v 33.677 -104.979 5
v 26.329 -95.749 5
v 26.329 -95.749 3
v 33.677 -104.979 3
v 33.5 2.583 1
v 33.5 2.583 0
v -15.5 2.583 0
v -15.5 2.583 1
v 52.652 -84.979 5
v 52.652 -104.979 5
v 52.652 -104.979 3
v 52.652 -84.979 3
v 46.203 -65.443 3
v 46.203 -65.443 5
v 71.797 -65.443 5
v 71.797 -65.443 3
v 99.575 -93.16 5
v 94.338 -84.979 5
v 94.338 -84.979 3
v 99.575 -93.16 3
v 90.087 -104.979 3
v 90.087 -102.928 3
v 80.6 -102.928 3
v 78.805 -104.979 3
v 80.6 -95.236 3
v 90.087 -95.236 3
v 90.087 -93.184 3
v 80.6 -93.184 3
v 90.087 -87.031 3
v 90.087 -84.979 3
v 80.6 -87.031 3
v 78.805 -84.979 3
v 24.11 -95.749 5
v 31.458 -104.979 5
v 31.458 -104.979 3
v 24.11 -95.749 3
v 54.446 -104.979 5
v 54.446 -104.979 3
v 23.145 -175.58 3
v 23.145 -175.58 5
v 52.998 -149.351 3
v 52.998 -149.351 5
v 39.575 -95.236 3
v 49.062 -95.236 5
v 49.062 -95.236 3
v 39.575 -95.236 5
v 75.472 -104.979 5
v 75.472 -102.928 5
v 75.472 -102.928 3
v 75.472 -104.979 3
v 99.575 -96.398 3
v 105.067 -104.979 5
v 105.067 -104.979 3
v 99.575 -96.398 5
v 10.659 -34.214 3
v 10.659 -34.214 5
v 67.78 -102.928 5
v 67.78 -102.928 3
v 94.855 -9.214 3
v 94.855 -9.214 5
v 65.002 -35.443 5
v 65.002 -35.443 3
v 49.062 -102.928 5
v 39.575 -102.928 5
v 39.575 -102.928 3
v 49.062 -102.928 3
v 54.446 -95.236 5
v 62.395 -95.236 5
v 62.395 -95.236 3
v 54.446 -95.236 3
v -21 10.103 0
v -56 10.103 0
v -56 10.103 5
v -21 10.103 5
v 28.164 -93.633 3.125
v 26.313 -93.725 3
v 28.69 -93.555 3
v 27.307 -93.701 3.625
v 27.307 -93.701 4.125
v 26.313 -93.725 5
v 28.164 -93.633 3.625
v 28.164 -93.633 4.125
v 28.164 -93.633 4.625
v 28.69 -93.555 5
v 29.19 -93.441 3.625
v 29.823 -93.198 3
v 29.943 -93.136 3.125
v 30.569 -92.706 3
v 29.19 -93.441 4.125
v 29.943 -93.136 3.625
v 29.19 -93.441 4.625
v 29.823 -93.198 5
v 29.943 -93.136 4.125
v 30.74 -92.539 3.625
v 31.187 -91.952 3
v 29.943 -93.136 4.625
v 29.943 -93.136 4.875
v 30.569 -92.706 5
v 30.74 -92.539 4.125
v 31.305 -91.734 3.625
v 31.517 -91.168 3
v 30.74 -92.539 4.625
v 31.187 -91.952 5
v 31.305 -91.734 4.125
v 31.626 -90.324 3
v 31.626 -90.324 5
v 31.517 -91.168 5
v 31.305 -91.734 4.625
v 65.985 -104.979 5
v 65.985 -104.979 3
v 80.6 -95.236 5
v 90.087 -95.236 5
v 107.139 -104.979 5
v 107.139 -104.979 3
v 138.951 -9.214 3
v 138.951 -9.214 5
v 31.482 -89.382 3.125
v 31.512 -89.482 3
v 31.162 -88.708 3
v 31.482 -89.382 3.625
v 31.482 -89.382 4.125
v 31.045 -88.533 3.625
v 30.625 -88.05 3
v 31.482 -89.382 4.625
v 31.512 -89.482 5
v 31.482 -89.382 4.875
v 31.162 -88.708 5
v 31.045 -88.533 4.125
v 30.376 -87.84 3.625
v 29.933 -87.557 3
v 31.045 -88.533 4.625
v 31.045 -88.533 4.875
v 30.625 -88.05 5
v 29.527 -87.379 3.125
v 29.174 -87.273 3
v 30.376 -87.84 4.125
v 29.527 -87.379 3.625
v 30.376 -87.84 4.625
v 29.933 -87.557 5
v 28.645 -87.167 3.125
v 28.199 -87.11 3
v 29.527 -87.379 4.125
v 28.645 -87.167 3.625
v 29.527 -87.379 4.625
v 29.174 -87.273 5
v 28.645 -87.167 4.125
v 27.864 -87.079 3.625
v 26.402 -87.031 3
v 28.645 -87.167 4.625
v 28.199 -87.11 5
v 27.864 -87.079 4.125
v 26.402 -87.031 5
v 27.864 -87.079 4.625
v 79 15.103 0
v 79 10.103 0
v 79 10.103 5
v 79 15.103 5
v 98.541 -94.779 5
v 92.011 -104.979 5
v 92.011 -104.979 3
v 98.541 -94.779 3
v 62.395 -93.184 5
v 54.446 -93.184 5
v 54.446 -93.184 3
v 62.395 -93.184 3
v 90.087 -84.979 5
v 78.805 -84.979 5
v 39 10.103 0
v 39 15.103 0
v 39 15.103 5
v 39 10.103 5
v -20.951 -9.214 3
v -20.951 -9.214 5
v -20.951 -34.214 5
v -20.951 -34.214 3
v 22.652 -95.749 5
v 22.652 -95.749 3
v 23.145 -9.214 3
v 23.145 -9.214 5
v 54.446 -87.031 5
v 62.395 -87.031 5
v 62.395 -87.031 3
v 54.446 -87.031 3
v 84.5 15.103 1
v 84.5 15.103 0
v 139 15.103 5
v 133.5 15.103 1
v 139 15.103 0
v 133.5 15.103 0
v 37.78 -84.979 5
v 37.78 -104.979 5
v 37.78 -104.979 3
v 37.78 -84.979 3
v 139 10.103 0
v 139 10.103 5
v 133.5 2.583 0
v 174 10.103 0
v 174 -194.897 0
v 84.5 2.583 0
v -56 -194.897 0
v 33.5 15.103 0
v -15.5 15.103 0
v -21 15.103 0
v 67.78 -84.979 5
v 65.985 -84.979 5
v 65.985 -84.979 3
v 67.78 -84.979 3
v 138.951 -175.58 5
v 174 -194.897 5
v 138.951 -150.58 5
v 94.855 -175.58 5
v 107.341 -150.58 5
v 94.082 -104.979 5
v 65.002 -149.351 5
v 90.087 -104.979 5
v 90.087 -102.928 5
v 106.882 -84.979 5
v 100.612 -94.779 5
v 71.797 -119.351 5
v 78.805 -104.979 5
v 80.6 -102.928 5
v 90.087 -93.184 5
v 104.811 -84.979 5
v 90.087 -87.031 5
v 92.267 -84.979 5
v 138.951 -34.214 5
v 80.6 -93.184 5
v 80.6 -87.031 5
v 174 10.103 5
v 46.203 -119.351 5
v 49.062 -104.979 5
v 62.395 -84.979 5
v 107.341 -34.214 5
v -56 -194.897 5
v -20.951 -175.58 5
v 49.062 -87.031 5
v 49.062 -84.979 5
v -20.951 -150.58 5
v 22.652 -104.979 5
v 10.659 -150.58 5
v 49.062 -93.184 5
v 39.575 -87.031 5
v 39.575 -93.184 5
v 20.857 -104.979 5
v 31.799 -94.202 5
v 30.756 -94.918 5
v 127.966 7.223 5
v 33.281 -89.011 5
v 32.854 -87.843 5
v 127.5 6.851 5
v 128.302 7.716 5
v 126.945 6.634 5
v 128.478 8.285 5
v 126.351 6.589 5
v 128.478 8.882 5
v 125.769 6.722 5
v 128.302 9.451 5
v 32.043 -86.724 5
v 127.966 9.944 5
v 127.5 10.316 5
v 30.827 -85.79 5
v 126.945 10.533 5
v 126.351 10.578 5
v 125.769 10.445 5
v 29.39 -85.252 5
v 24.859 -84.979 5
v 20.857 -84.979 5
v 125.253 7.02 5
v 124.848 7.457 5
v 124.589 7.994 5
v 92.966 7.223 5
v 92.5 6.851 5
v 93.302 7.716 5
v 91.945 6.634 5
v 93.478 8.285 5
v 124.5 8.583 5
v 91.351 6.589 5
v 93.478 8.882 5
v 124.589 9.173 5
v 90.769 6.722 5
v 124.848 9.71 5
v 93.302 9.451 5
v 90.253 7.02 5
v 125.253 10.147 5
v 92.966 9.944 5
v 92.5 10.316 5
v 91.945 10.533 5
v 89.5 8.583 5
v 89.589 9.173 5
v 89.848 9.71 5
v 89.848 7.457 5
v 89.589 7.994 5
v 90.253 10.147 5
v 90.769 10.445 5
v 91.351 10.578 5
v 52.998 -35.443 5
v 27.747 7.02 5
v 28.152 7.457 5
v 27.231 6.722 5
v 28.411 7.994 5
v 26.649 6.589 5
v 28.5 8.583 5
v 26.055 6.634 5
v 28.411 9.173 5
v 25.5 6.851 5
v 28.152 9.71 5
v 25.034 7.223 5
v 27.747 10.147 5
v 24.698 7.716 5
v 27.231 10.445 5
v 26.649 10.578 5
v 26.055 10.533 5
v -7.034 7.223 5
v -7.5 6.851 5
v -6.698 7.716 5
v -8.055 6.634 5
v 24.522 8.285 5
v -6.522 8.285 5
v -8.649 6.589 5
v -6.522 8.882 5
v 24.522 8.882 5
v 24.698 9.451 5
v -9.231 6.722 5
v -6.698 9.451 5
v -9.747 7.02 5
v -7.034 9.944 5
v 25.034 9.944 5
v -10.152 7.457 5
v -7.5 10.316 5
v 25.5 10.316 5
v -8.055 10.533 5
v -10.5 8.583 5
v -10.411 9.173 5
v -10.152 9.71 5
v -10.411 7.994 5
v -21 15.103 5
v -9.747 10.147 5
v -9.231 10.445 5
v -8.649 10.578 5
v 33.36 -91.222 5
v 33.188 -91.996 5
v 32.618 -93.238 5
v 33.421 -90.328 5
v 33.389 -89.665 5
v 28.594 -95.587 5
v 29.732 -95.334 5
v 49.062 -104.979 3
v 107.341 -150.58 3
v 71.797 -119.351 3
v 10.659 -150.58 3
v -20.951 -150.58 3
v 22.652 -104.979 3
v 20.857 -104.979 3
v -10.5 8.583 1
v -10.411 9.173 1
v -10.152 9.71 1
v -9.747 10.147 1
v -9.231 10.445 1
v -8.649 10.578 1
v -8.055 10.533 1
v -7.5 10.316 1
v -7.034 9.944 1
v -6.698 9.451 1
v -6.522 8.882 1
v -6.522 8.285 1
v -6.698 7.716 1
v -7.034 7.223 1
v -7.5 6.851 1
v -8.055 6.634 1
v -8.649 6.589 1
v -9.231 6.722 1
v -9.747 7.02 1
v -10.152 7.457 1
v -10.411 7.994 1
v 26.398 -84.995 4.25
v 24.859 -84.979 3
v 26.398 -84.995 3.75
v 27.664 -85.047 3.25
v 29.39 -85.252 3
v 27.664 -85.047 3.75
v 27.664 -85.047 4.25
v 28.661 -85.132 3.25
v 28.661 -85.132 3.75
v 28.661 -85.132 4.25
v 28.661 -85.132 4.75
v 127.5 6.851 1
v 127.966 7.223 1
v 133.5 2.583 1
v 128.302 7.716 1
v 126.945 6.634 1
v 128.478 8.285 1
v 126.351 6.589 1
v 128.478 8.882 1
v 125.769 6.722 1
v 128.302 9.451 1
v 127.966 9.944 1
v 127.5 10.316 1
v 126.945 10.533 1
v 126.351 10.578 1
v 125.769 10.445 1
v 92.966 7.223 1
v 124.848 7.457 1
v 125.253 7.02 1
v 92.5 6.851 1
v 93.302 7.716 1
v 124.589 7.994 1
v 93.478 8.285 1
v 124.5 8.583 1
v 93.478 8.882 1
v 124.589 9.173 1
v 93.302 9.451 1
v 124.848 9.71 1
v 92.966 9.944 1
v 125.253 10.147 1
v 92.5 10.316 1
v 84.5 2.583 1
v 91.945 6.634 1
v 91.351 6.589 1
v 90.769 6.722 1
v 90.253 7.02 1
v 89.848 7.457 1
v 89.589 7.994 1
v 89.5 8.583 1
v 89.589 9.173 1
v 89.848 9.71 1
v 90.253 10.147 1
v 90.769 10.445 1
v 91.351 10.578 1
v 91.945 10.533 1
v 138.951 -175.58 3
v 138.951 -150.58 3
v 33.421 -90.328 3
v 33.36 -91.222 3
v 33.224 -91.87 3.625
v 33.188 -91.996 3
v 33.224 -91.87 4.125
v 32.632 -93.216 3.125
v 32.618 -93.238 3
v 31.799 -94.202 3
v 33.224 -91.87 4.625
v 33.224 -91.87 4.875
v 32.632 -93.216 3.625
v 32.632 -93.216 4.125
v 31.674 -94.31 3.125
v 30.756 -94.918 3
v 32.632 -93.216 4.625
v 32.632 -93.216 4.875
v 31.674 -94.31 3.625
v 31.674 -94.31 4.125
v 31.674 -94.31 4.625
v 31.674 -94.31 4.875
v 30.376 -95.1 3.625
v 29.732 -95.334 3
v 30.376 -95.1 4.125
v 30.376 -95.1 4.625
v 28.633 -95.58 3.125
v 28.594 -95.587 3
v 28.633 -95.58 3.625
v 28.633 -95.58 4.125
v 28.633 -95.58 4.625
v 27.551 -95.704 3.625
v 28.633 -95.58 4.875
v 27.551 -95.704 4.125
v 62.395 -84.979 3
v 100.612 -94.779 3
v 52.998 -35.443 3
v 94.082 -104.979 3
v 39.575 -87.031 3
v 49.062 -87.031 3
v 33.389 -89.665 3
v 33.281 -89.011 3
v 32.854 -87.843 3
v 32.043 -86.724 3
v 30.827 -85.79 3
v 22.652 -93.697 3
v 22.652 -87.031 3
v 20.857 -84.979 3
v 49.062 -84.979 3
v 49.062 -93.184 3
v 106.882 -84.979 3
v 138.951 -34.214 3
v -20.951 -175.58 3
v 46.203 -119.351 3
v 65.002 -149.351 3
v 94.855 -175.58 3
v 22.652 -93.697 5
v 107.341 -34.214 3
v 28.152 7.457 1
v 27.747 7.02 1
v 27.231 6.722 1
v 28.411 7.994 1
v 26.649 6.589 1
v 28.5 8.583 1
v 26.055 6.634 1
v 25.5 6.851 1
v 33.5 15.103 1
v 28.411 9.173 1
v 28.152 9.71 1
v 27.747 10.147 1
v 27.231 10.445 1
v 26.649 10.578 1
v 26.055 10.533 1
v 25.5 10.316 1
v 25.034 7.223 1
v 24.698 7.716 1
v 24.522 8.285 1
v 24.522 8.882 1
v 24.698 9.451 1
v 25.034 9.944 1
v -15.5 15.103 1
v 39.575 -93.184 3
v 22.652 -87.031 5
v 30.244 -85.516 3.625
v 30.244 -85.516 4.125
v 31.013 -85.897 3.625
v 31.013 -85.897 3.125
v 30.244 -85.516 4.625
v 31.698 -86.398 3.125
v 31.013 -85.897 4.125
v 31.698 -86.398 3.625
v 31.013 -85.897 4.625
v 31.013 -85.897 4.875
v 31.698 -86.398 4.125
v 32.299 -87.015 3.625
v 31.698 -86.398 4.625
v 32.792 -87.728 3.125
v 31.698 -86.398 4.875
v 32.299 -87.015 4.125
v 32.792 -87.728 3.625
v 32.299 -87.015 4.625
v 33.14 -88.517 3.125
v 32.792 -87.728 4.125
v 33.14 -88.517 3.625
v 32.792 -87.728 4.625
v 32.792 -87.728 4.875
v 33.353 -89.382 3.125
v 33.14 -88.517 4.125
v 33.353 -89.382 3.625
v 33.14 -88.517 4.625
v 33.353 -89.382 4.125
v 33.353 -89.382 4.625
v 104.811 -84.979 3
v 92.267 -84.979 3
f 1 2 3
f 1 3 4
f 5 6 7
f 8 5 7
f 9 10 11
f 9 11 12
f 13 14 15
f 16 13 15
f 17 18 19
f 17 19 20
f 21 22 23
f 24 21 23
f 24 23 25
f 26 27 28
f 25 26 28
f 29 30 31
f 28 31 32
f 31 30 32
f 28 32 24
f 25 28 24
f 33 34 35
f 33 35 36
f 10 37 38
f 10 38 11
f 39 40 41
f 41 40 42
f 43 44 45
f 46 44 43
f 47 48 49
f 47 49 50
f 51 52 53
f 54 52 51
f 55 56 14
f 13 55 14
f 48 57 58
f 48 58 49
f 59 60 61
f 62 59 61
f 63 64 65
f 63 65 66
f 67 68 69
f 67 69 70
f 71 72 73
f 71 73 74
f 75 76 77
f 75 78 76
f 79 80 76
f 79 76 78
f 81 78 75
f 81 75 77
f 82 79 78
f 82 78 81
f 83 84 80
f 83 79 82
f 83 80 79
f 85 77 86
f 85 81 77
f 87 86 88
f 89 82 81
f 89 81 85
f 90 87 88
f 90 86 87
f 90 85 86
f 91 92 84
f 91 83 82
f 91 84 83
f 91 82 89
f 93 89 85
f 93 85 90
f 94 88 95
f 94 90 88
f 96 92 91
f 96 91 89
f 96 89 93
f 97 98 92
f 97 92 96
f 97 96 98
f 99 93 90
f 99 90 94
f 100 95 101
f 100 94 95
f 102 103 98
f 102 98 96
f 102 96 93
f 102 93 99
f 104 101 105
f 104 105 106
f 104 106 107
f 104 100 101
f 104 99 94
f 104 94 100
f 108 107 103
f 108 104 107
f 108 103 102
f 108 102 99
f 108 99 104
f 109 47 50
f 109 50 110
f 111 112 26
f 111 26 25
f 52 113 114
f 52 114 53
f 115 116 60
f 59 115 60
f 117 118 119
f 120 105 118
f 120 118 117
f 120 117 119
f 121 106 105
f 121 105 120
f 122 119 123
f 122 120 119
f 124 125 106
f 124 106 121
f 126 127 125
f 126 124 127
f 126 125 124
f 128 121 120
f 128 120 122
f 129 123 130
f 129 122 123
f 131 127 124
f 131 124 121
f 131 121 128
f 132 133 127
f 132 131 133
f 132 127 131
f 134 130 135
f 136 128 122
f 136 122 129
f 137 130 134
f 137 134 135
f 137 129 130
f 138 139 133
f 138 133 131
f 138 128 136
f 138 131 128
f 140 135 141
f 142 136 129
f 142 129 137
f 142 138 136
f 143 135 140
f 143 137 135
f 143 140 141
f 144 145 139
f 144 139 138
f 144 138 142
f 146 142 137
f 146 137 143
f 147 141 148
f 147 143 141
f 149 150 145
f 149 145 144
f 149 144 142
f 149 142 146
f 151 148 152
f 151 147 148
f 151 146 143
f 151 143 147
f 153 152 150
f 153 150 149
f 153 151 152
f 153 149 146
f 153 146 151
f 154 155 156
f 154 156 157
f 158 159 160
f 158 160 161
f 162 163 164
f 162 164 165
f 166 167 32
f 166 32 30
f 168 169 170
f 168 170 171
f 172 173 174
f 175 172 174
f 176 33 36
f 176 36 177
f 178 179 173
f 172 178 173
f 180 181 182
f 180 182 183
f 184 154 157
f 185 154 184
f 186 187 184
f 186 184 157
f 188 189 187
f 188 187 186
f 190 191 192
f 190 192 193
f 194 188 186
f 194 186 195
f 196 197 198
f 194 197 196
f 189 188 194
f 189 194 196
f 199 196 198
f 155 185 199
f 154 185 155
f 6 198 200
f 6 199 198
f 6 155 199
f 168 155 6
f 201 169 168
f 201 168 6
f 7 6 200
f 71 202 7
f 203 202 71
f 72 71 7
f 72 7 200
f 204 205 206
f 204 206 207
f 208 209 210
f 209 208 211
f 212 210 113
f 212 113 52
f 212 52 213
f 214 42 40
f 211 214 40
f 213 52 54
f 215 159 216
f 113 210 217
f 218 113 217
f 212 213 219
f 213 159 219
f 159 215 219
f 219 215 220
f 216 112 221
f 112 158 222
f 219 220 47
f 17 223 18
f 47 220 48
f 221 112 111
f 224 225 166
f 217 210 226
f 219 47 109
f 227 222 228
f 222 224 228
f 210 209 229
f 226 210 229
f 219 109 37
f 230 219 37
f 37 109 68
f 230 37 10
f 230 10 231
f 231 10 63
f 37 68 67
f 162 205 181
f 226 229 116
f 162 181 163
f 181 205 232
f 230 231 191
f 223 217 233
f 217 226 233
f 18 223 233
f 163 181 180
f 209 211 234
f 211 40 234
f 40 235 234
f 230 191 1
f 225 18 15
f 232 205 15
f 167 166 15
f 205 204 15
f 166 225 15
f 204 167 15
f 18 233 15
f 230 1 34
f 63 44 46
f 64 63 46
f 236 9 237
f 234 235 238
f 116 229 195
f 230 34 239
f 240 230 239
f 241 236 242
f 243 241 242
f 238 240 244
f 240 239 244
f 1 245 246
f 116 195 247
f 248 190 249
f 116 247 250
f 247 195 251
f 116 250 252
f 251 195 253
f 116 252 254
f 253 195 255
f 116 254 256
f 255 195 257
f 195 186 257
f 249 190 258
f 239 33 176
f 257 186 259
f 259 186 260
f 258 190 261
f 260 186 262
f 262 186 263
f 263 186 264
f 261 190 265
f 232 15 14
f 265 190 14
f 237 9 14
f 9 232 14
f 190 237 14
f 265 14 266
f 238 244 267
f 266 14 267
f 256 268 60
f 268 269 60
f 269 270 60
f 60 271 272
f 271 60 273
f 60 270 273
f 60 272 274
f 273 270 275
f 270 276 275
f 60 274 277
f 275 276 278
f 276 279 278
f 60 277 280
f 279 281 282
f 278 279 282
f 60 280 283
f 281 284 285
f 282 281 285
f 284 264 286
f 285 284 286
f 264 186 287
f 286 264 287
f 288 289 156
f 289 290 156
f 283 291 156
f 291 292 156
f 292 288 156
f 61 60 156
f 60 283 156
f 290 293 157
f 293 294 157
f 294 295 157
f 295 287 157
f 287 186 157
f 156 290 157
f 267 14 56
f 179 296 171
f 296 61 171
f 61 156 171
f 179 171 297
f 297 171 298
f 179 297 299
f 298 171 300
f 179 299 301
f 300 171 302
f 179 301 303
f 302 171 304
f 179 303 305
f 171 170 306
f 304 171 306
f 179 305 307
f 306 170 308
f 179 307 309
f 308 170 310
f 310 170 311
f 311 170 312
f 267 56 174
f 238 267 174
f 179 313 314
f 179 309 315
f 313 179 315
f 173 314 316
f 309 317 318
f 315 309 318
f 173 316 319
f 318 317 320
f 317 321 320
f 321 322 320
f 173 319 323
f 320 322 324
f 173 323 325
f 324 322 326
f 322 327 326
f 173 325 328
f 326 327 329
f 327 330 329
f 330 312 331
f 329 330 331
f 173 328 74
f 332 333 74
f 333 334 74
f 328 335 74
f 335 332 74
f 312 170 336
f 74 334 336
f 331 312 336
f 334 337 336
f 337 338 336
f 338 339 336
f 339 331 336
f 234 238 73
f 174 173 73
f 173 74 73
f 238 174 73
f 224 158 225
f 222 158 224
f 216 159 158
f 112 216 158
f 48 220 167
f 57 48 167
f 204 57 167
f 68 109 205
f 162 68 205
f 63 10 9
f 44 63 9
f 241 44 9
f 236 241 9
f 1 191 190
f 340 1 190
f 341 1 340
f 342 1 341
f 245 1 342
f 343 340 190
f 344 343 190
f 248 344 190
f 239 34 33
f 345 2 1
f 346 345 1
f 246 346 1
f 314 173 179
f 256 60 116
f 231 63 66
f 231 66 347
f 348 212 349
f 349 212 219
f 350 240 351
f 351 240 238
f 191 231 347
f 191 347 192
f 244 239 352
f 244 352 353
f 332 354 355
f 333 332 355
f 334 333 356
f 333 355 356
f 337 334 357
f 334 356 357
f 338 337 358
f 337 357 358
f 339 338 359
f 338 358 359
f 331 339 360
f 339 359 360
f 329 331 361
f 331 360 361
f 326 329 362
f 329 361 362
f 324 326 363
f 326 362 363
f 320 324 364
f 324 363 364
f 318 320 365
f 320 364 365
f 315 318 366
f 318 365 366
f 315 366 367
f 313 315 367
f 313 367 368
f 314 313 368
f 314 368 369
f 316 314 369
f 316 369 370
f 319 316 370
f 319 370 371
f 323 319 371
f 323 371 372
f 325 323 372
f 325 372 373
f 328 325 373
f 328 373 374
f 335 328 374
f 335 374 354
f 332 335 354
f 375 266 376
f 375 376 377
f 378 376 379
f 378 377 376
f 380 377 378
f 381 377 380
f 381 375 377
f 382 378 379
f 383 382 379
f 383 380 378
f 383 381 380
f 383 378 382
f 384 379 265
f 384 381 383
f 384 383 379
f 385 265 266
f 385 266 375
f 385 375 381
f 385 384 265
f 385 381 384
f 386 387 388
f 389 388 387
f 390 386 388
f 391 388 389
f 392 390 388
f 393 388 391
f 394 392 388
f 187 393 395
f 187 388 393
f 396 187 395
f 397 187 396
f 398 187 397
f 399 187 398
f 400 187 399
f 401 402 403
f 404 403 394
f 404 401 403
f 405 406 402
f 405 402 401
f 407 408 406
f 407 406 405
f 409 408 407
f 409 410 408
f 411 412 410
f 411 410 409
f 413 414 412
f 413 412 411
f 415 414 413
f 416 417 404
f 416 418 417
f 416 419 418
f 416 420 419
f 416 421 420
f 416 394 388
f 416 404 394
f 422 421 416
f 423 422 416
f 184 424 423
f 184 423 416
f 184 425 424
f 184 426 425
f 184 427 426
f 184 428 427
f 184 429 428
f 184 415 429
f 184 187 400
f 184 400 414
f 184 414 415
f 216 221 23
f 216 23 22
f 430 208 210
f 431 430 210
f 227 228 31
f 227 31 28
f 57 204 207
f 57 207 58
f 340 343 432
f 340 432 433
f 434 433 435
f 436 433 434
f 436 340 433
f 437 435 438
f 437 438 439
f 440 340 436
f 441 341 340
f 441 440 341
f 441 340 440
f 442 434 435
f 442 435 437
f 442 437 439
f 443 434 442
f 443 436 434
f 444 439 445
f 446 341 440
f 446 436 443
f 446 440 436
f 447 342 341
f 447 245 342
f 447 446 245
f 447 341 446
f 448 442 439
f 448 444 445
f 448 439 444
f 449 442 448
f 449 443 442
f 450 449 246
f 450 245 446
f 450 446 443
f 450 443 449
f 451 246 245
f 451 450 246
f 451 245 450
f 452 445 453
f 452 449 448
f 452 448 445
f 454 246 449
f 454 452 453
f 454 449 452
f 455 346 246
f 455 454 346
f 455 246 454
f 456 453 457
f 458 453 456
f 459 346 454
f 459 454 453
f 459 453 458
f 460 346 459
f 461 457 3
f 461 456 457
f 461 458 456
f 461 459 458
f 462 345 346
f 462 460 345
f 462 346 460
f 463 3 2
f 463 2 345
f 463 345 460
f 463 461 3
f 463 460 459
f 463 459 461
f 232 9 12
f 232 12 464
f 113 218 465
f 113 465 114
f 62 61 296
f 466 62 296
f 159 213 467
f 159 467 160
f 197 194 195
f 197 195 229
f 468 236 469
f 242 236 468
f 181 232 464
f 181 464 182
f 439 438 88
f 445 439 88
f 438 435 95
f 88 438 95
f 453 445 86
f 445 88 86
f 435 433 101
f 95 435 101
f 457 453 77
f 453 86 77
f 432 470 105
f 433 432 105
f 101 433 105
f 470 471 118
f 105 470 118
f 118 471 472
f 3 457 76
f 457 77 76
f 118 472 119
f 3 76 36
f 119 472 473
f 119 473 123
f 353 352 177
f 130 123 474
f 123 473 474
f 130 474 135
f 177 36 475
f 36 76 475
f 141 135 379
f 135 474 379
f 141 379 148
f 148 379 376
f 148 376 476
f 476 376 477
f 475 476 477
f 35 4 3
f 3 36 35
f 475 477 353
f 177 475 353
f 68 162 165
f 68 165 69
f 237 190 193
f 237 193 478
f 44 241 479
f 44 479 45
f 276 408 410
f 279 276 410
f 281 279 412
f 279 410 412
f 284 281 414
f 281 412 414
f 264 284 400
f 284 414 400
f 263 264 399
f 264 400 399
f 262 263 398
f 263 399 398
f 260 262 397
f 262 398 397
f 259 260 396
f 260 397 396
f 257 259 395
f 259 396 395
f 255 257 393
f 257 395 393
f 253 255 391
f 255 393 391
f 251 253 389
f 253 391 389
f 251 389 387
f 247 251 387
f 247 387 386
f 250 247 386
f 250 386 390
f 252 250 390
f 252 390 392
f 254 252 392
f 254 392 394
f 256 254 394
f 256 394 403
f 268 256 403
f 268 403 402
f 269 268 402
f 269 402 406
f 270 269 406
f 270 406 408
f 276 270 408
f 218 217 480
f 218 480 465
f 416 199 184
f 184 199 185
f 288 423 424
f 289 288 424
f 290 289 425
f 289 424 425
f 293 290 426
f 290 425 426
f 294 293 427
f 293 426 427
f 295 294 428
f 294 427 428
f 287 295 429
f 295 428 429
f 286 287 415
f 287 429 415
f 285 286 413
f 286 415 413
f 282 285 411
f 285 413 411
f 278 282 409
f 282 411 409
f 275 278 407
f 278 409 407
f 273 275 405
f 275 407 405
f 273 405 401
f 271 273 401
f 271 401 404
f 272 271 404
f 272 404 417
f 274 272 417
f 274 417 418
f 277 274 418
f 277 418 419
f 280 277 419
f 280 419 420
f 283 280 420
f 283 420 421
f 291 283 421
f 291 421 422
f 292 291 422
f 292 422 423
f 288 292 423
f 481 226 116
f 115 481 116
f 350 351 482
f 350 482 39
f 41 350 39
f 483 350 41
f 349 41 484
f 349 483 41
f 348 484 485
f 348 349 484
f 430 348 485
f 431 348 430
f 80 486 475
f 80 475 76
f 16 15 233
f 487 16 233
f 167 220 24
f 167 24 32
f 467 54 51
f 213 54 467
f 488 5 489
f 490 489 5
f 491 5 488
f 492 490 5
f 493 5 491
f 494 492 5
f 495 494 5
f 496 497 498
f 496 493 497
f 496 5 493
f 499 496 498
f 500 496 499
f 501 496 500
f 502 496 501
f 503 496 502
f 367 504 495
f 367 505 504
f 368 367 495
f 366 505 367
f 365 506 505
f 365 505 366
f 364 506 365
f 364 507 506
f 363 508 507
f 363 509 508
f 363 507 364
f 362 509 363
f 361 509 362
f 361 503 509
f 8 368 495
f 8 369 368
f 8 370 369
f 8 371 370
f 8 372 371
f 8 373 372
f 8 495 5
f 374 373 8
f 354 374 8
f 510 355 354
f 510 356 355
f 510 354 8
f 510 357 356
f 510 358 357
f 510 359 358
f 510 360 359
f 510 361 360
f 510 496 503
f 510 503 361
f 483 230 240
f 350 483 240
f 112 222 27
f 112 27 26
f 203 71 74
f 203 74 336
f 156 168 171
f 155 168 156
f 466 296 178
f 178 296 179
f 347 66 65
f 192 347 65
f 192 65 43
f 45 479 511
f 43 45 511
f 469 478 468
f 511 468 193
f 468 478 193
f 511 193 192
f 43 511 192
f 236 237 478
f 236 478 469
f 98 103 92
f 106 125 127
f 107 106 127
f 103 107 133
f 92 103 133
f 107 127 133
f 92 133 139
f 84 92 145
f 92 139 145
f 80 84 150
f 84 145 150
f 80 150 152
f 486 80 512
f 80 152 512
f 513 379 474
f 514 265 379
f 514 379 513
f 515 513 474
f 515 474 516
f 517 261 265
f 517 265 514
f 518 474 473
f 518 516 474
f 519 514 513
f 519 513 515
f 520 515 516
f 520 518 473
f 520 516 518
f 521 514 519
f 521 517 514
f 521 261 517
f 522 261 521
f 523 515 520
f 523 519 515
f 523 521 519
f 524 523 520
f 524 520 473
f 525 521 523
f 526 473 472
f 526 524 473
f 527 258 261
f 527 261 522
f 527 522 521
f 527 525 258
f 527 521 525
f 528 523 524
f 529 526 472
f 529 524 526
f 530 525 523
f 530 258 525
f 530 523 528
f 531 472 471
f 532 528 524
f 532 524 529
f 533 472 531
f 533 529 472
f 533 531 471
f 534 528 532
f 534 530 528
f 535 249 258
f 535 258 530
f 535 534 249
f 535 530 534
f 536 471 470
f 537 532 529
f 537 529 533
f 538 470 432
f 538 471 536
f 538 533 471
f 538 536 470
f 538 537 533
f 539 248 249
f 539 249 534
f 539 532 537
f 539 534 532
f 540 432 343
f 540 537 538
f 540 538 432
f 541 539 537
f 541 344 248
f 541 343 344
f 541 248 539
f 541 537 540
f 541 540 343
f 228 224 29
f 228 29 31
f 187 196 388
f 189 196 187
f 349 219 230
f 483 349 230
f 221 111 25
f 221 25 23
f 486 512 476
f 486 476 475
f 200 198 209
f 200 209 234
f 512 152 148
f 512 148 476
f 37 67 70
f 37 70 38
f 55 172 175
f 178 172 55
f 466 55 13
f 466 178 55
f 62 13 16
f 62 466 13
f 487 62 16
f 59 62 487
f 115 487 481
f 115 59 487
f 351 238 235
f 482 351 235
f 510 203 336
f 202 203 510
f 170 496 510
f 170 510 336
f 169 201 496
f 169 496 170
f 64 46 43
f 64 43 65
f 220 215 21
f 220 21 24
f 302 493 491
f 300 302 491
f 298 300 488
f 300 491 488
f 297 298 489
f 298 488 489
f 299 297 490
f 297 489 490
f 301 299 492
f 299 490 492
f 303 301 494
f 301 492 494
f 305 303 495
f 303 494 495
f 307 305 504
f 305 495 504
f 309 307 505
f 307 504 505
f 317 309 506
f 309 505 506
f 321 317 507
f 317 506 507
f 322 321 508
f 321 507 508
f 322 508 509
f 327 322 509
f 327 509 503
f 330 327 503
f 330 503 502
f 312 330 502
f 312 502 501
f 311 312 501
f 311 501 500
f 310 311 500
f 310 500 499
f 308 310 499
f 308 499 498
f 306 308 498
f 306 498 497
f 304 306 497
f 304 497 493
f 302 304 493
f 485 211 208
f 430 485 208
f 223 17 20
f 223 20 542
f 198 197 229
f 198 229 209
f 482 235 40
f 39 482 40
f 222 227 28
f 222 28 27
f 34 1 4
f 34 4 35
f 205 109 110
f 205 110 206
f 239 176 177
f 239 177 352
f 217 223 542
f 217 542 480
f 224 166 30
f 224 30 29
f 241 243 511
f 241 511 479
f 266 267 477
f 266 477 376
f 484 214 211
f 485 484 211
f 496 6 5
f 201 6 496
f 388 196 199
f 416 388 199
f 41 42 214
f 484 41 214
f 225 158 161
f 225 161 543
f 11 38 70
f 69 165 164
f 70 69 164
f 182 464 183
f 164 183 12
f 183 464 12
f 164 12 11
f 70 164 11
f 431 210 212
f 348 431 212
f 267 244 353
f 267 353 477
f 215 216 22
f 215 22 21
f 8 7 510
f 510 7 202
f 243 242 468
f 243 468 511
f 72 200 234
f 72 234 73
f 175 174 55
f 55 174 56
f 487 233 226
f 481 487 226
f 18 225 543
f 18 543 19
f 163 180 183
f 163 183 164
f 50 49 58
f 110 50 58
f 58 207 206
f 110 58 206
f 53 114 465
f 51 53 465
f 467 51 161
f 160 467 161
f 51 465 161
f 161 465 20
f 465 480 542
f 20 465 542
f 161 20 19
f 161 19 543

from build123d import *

# Parameters (mm, degrees)
BOSS_EXTRU_1_DEPTH      = 5
ENL_V_MAT_EXTRU_2_DEPTH = 2
ENL_V_MAT_EXTRU_3_DEPTH = 2
ESQUISSE4_W             = 49
ESQUISSE4_H             = 12.519470299
ENL_V_MAT_EXTRU_5_DEPTH = 1
ESQUISSE5_R             = 2
ENL_V_MAT_EXTRU_6_DEPTH = 262.315639817


with BuildPart() as part:
    # Esquisse1 → Boss.-Extru.1 (new body)
    with BuildSketch(Plane.XY):
        Polygon((-56, 10.102941176), (-21, 10.102941176), (-21, 15.102941176), (39, 15.102941176), (39, 10.102941176), (79, 10.102941176), (79, 15.102941176), (139, 15.102941176), (139, 10.102941176), (174, 10.102941176), (174, -194.897058824), (-56, -194.897058824), align=None)
    extrude(amount=BOSS_EXTRU_1_DEPTH)

    # Esquisse2 → Enlèv. mat.-Extru.2 (cut)
    with BuildSketch(Plane.XY.offset(5)):
        Polygon((23.144921781, -9.214330656), (-20.950579999, -9.214330656), (-20.950579999, -34.214330656), (10.659241187, -34.214330656), (46.203012632, -65.443309996), (71.796987368, -65.443309996), (107.340758813, -34.214330656), (138.950579999, -34.214330656), (138.950579999, -9.214330656), (94.855078219, -9.214330656), (65.002138205, -35.443309996), (52.997861795, -35.443309996), align=None)
        Polygon((10.659241187, -150.579786991), (-20.950579999, -150.579786991), (-20.950579999, -175.579786991), (23.144921781, -175.579786991), (52.997861795, -149.350807651), (65.002138205, -149.350807651), (94.855078219, -175.579786991), (138.950579999, -175.579786991), (138.950579999, -150.579786991), (107.340758813, -150.579786991), (71.796987368, -119.350807651), (46.203012632, -119.350807651), align=None)
    extrude(amount=-ENL_V_MAT_EXTRU_2_DEPTH, mode=Mode.SUBTRACT)

    # Esquisse3 → Enlèv. mat.-Extru.3 (cut)
    # profile 1 of 6: a face of its own
    with BuildSketch(Plane.XY.offset(5)):
        with BuildLine():
            Line((20.856664396, -84.979311094), (24.859068242, -84.979311094))
            add(Edge.make_bspline(
                [(24.859068242, -84.979311094), (25.126160405, -84.980200157), (25.639006945, -84.981907256), (26.373711347, -84.991425901), (27.041294758, -85.018707934), (27.641408126, -85.042185554), (28.17404044, -85.084996647), (28.640824959, -85.125914631), (29.039611801, -85.179478407), (29.281016666, -85.229223681), (29.390318242, -85.251746992)],
                knots=[0, 0, 0, 0, 1.410062039, 2.707475311, 3.878576406, 4.937260626, 5.877586885, 6.699081471, 7.410979367, 8, 8, 8, 8], degree=3))
            add(Edge.make_bspline(
                [(29.390318242, -85.251746992), (29.536641809, -85.287899937), (29.826167463, -85.359434586), (30.243024983, -85.510632305), (30.640249692, -85.685601589), (31.016191545, -85.891108562), (31.368967495, -86.128678732), (31.702214985, -86.39421086), (32.017446204, -86.686252036), (32.301912662, -87.012165416), (32.570135815, -87.354088328), (32.796356538, -87.723824081), (32.991364993, -88.110461382), (33.14662509, -88.51793234), (33.271642082, -88.942285322), (33.359792021, -89.387364161), (33.41265595, -89.851141161), (33.418037982, -90.167472069), (33.42076696, -90.327868787)],
                knots=[0, 0, 0, 0, 1.027469482, 2.033020251, 3.019912614, 3.986113645, 4.951240523, 5.91722682, 6.890402269, 7.87763091, 8.8651537, 9.85103654, 10.82876324, 11.815024772, 12.821070561, 13.842952187, 14.906261191, 16, 16, 16, 16], degree=3))
            add(Edge.make_bspline(
                [(33.42076696, -90.327868787), (33.412372686, -90.594355099), (33.395993281, -91.114338915), (33.243278403, -91.868972523), (32.993126862, -92.572911464), (32.648422353, -93.225269395), (32.20945392, -93.813330226), (31.681883685, -94.329847113), (31.065417334, -94.762075185), (30.491535529, -95.061805498), (29.984597245, -95.253764975), (29.567264029, -95.388829883), (29.112024157, -95.493183971), (28.623239388, -95.586670438), (28.098875642, -95.657251549), (27.540189703, -95.708946374), (26.946783122, -95.741255224), (26.539131297, -95.74606668), (26.329420807, -95.748541864)],
                knots=[0, 0, 0, 0, 1.260483769, 2.459530307, 3.627416485, 4.787058657, 5.939039949, 7.08810263, 8.267026773, 9.491475466, 10.141966685, 10.831826277, 11.566392101, 12.351337768, 13.187381173, 14.07005841, 15.007169909, 16, 16, 16, 16], degree=3))
            Line((26.329420807, -95.748541864), (33.677177217, -104.979311094))
            Line((33.677177217, -104.979311094), (31.457625935, -104.979311094))
            Line((31.457625935, -104.979311094), (24.109869525, -95.748541864))
            Line((24.109869525, -95.748541864), (22.651536191, -95.748541864))
            Line((22.651536191, -95.748541864), (22.651536191, -104.979311094))
            Line((22.651536191, -104.979311094), (20.856664396, -104.979311094))
            Line((20.856664396, -104.979311094), (20.856664396, -84.979311094))
        make_face()
        with BuildLine():
            Line((22.651536191, -87.030593146), (22.651536191, -93.697259812))
            Line((22.651536191, -93.697259812), (26.313395166, -93.725304684))
            add(Edge.make_bspline(
                [(26.313395166, -93.725304684), (26.484366817, -93.725380322), (26.815758571, -93.72552693), (27.295190942, -93.702705352), (27.74159158, -93.676743533), (28.153253021, -93.637032987), (28.530359166, -93.585855434), (28.872721527, -93.521838382), (29.180898966, -93.447255167), (29.540319186, -93.331817305), (29.941670794, -93.148925772), (30.377850564, -92.882837208), (30.749292494, -92.548156527), (31.06310885, -92.165451064), (31.31527703, -91.744672499), (31.493060198, -91.290864675), (31.605874154, -90.815484115), (31.619180128, -90.48875207), (31.625895166, -90.323862376)],
                knots=[0, 0, 0, 0, 1.146690395, 2.22261258, 3.21895312, 4.145990853, 4.996080663, 5.770904154, 6.481378293, 7.121626537, 8.300444488, 9.431385265, 10.535395872, 11.636531494, 12.74115979, 13.810798291, 14.895190096, 16, 16, 16, 16], degree=3))
            add(Edge.make_bspline(
                [(31.625895166, -90.323862376), (31.619025902, -90.163024812), (31.605413529, -89.844303448), (31.494277709, -89.377698247), (31.306338387, -88.937315675), (31.053068456, -88.524947189), (30.744501856, -88.150628698), (30.382685783, -87.830359252), (29.977513239, -87.566076597), (29.598820677, -87.397194423), (29.260339463, -87.293652404), (28.966455692, -87.220788611), (28.634390105, -87.162248788), (28.262530341, -87.115345583), (27.852463879, -87.075031616), (27.402117302, -87.047878595), (26.914478557, -87.031799372), (26.576496094, -87.031004578), (26.401536191, -87.030593146)],
                knots=[0, 0, 0, 0, 1.101028733, 2.181837193, 3.264309656, 4.369019818, 5.486613113, 6.575447106, 7.666700264, 8.788928104, 9.402425223, 10.0903467, 10.862060571, 11.710948788, 12.657782767, 13.684531032, 14.801375019, 16, 16, 16, 16], degree=3))
            Line((26.401536191, -87.030593146), (22.651536191, -87.030593146))
        make_face(mode=Mode.SUBTRACT)
    # profile 2 of 6: a face of its own
    with BuildSketch(Plane.XY.offset(5)):
        Polygon((37.779741319, -84.979311094), (49.061792601, -84.979311094), (49.061792601, -87.030593146), (39.574613114, -87.030593146), (39.574613114, -93.184439299), (49.061792601, -93.184439299), (49.061792601, -95.235721351), (39.574613114, -95.235721351), (39.574613114, -102.928029043), (49.061792601, -102.928029043), (49.061792601, -104.979311094), (37.779741319, -104.979311094), align=None)
    # profile 3 of 6: a face of its own
    with BuildSketch(Plane.XY.offset(5)):
        Polygon((52.651536191, -84.979311094), (62.395125935, -84.979311094), (62.395125935, -87.030593146), (54.446407986, -87.030593146), (54.446407986, -93.184439299), (62.395125935, -93.184439299), (62.395125935, -95.235721351), (54.446407986, -95.235721351), (54.446407986, -104.979311094), (52.651536191, -104.979311094), align=None)
    # profile 4 of 6: a face of its own
    with BuildSketch(Plane.XY.offset(5)):
        Polygon((65.984869525, -84.979311094), (67.779741319, -84.979311094), (67.779741319, -102.928029043), (75.472049012, -102.928029043), (75.472049012, -104.979311094), (65.984869525, -104.979311094), align=None)
    # profile 5 of 6: a face of its own
    with BuildSketch(Plane.XY.offset(5)):
        Polygon((78.805382345, -84.979311094), (90.087433627, -84.979311094), (90.087433627, -87.030593146), (80.60025414, -87.030593146), (80.60025414, -93.184439299), (90.087433627, -93.184439299), (90.087433627, -95.235721351), (80.60025414, -95.235721351), (80.60025414, -102.928029043), (90.087433627, -102.928029043), (90.087433627, -104.979311094), (78.805382345, -104.979311094), align=None)
    # profile 6 of 6: a face of its own
    with BuildSketch(Plane.XY.offset(5)):
        Polygon((92.266920807, -84.979311094), (94.338234909, -84.979311094), (99.574613114, -93.160400838), (104.810991319, -84.979311094), (106.882305422, -84.979311094), (100.612273371, -94.778990582), (107.138715678, -104.979311094), (105.067401576, -104.979311094), (99.574613114, -96.397580325), (94.081824653, -104.979311094), (92.01051055, -104.979311094), (98.540959268, -94.778990582), align=None)
    extrude(amount=-ENL_V_MAT_EXTRU_3_DEPTH, mode=Mode.SUBTRACT)

    # Esquisse4 → Enlèv. mat.-Extru.5 (cut)
    with BuildSketch(Plane(origin=(0, 0, 0), x_dir=(-1, 0, 0), z_dir=(0, 0, -1))):
        with Locations((-9, 8.843206027)):
            Rectangle(ESQUISSE4_W, ESQUISSE4_H)
        with Locations((-109, 8.843206027)):
            Rectangle(ESQUISSE4_W, ESQUISSE4_H)
    extrude(amount=-ENL_V_MAT_EXTRU_5_DEPTH, mode=Mode.SUBTRACT)

    # Esquisse5 → Enlèv. mat.-Extru.6 (cut, through all)
    with BuildSketch(Plane(origin=(0, 0, 0), x_dir=(-1, 0, 0), z_dir=(0, 0, -1))):
        with Locations((8.5, 8.583470877)):
            Circle(ESQUISSE5_R)
        with Locations(Location((-26.5, 8.583470877, 0), (0, 0, 180))):
            Circle(ESQUISSE5_R)
        with Locations((-126.5, 8.583470877)):
            Circle(ESQUISSE5_R)
        with Locations((-91.5, 8.583470877)):
            Circle(ESQUISSE5_R)
    extrude(amount=-ENL_V_MAT_EXTRU_6_DEPTH, mode=Mode.SUBTRACT)


solid = part.part
